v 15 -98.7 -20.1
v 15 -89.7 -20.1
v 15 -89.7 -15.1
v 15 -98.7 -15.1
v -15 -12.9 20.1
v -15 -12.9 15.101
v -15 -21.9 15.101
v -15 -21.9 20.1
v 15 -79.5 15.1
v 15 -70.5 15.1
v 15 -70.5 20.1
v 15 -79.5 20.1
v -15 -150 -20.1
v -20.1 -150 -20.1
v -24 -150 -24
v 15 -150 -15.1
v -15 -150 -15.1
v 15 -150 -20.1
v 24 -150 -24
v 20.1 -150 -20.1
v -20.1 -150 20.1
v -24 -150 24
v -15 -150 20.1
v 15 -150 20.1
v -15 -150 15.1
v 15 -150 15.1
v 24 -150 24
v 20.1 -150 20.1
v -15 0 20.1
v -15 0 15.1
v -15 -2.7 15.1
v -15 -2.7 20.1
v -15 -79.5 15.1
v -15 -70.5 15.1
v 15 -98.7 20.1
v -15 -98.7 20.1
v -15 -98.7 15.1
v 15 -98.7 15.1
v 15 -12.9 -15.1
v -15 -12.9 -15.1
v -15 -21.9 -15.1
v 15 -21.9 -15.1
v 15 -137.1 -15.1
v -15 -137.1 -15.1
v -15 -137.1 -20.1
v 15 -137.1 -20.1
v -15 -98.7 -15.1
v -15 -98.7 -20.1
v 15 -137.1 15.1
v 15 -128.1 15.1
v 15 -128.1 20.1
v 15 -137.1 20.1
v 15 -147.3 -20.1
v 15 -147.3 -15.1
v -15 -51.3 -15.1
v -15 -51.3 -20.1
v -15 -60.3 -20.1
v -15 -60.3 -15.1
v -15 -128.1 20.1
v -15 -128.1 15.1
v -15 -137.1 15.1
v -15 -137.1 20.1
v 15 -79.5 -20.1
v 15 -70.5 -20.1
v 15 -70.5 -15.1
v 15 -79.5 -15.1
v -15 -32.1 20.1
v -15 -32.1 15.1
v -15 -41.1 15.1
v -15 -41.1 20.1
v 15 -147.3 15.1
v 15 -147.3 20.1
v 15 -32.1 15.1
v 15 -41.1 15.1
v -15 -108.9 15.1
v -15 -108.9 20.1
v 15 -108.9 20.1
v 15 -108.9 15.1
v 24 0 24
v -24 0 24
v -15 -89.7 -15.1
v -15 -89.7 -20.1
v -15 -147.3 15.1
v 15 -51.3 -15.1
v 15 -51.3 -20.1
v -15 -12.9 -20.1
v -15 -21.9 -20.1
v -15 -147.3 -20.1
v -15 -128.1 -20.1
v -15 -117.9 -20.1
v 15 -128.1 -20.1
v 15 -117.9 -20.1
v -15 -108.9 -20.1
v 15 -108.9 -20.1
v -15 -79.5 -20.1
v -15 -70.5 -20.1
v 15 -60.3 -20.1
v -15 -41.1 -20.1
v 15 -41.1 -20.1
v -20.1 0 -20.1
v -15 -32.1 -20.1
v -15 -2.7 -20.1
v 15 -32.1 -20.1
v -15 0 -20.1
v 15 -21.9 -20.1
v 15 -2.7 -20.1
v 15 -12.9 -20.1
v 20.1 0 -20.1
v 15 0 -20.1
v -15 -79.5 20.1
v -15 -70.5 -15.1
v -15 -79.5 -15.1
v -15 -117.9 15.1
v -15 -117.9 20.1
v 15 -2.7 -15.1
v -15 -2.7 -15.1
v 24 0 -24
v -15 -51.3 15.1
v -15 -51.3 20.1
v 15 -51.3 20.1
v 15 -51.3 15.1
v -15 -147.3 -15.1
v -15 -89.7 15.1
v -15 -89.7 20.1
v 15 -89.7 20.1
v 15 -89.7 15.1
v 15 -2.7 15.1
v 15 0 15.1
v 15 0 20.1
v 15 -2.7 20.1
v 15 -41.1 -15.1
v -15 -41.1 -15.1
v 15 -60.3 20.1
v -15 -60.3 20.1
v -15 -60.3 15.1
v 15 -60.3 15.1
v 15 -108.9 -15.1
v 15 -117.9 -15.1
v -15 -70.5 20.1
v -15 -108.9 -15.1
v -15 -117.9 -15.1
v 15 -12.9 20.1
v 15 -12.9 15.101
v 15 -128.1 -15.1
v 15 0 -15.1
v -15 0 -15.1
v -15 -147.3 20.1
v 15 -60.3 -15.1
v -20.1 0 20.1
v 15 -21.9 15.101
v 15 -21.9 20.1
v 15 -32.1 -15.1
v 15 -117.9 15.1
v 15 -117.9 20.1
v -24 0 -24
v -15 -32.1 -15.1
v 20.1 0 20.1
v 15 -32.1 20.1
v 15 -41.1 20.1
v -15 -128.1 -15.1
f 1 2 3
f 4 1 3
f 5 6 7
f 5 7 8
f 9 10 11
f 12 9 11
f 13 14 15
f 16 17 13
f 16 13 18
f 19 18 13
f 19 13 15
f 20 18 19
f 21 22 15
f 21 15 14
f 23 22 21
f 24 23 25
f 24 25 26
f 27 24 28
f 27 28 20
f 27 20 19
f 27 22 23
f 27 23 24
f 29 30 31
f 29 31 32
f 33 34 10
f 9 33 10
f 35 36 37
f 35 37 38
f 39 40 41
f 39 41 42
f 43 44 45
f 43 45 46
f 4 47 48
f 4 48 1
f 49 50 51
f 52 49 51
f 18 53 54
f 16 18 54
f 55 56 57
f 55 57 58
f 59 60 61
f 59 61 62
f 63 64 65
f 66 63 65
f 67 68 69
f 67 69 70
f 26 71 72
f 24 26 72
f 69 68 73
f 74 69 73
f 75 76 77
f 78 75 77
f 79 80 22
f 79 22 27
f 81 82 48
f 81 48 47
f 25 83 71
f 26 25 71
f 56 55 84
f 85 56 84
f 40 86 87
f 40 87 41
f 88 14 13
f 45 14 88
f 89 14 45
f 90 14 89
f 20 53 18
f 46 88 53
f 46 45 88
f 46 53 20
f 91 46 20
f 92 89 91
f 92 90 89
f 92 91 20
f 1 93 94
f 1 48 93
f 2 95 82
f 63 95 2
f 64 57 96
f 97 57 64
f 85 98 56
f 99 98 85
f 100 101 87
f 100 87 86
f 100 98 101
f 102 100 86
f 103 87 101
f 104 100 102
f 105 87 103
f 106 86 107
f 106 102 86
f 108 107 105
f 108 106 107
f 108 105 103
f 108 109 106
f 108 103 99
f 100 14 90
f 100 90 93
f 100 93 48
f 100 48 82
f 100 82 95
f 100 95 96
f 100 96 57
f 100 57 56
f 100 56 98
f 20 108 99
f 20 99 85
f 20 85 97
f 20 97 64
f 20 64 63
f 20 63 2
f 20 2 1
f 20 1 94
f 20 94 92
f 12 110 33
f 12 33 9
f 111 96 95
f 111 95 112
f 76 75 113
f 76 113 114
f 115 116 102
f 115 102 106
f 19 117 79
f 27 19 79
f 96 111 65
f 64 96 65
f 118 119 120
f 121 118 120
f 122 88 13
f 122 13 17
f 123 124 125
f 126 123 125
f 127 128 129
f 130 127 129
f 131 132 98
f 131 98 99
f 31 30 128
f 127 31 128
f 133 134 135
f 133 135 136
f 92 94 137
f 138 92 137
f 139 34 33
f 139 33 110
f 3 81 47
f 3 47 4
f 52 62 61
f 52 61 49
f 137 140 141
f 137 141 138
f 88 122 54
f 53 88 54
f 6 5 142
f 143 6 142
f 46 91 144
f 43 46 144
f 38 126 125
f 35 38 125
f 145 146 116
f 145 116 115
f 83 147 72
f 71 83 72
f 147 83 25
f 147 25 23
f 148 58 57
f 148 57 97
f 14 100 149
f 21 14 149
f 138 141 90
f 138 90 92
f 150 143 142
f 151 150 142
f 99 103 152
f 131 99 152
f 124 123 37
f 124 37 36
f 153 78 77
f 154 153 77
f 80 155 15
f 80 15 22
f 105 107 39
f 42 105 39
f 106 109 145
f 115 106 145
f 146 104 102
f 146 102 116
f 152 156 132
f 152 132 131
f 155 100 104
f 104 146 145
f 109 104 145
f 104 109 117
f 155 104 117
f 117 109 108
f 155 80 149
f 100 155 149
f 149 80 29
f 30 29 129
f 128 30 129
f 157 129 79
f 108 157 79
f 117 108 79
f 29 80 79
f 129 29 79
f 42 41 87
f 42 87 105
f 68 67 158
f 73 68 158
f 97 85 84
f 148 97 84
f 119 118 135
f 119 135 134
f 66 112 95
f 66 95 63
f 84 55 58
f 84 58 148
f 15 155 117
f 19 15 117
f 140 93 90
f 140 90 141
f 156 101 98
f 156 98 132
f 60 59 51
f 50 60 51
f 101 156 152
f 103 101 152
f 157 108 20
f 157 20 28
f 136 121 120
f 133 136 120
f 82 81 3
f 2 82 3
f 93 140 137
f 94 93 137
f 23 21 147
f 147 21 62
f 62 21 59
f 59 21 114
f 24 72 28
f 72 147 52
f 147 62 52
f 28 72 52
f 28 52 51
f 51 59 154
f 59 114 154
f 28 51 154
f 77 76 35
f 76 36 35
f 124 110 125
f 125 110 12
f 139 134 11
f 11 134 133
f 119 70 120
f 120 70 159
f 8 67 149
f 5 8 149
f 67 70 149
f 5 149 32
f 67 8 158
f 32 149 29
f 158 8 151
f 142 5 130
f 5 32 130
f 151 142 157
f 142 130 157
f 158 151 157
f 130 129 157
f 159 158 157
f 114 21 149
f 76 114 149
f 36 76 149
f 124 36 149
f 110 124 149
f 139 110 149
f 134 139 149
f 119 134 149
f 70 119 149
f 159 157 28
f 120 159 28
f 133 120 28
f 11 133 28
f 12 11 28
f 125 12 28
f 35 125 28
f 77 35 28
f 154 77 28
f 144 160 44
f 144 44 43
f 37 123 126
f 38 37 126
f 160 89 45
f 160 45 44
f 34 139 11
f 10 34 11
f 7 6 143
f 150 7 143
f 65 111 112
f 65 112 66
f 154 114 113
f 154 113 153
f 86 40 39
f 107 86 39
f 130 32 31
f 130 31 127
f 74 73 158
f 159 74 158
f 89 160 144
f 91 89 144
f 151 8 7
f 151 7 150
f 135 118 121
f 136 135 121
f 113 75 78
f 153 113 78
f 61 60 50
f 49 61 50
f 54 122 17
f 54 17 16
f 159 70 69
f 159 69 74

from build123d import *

# Parameters (mm, degrees)
F0_W      = 48
F0_H      = 48
F0_W_2    = 40.2
F0_H_2    = 40.2
F1_DEPTH  = 150
F2_W      = 30
F2_H      = 5
F3_DEPTH  = 2.7
F5_W      = 30
F5_H      = 5
F6_DEPTH  = 9
F8_W      = 30
F8_H      = 5
F9_DEPTH  = 9
F11_W     = 30
F11_H     = 5
F12_DEPTH = 9
F14_W     = 30
F14_H     = 5
F15_DEPTH = 9
F17_W     = 30
F17_H     = 5
F18_DEPTH = 9
F20_W     = 30
F20_H     = 5
F21_DEPTH = 9
F23_W     = 30
F23_H     = 5
F24_DEPTH = 9
F26_W     = 30
F26_H     = 5
F27_DEPTH = 2.7


with BuildPart() as f1:
    # F0 (on Front) → F1 (new body)
    with BuildSketch(Plane.XZ):
        Rectangle(F0_W, F0_H)
        Rectangle(F0_W_2, F0_H_2, mode=Mode.SUBTRACT)
    extrude(amount=F1_DEPTH)

    # F2 (on Front) → F3 (join)
    with BuildSketch(Plane.XZ):
        with Locations((0, 17.6)):
            Rectangle(F2_W, F2_H)
        with Locations((0, -17.6)):
            Rectangle(F2_W, F2_H)
    extrude(amount=F3_DEPTH)

    # F5 (on offset) → F6 (join)
    with BuildSketch(Plane.XZ.offset(12.9)):
        with Locations((0, 17.601031)):
            Rectangle(F5_W, F5_H)
        with Locations((0, -17.6)):
            Rectangle(F5_W, F5_H)
    extrude(amount=F6_DEPTH)

    # F8 (on offset) → F9 (join)
    with BuildSketch(Plane.XZ.offset(32.1)):
        with Locations((0, 17.6)):
            Rectangle(F8_W, F8_H)
        with Locations((0, -17.6)):
            Rectangle(F8_W, F8_H)
    extrude(amount=F9_DEPTH)

    # F11 (on offset) → F12 (join)
    with BuildSketch(Plane.XZ.offset(51.3)):
        with Locations((0, -17.6)):
            Rectangle(F11_W, F11_H)
        with Locations((0, 17.6)):
            Rectangle(F11_W, F11_H)
    extrude(amount=F12_DEPTH)

    # F14 (on offset) → F15 (join)
    with BuildSketch(Plane.XZ.offset(70.5)):
        with Locations((0, 17.6)):
            Rectangle(F14_W, F14_H)
        with Locations((0, -17.6)):
            Rectangle(F14_W, F14_H)
    extrude(amount=F15_DEPTH)

    # F17 (on offset) → F18 (join)
    with BuildSketch(Plane.XZ.offset(89.7)):
        with Locations((0, 17.6)):
            Rectangle(F17_W, F17_H)
        with Locations((0, -17.6)):
            Rectangle(F17_W, F17_H)
    extrude(amount=F18_DEPTH)

    # F20 (on offset) → F21 (join)
    with BuildSketch(Plane.XZ.offset(108.9)):
        with Locations((0, 17.6)):
            Rectangle(F20_W, F20_H)
        with Locations((0, -17.6)):
            Rectangle(F20_W, F20_H)
    extrude(amount=F21_DEPTH)

    # F23 (on offset) → F24 (join)
    with BuildSketch(Plane.XZ.offset(128.1)):
        with Locations((0, 17.6)):
            Rectangle(F23_W, F23_H)
        with Locations((0, -17.6)):
            Rectangle(F23_W, F23_H)
    extrude(amount=F24_DEPTH)

    # F26 (on offset) → F27 (join)
    with BuildSketch(Plane.XZ.offset(147.3)):
        with Locations((0, 17.6)):
            Rectangle(F26_W, F26_H)
        with Locations((0, -17.6)):
            Rectangle(F26_W, F26_H)
    extrude(amount=F27_DEPTH)


solid = f1.part
